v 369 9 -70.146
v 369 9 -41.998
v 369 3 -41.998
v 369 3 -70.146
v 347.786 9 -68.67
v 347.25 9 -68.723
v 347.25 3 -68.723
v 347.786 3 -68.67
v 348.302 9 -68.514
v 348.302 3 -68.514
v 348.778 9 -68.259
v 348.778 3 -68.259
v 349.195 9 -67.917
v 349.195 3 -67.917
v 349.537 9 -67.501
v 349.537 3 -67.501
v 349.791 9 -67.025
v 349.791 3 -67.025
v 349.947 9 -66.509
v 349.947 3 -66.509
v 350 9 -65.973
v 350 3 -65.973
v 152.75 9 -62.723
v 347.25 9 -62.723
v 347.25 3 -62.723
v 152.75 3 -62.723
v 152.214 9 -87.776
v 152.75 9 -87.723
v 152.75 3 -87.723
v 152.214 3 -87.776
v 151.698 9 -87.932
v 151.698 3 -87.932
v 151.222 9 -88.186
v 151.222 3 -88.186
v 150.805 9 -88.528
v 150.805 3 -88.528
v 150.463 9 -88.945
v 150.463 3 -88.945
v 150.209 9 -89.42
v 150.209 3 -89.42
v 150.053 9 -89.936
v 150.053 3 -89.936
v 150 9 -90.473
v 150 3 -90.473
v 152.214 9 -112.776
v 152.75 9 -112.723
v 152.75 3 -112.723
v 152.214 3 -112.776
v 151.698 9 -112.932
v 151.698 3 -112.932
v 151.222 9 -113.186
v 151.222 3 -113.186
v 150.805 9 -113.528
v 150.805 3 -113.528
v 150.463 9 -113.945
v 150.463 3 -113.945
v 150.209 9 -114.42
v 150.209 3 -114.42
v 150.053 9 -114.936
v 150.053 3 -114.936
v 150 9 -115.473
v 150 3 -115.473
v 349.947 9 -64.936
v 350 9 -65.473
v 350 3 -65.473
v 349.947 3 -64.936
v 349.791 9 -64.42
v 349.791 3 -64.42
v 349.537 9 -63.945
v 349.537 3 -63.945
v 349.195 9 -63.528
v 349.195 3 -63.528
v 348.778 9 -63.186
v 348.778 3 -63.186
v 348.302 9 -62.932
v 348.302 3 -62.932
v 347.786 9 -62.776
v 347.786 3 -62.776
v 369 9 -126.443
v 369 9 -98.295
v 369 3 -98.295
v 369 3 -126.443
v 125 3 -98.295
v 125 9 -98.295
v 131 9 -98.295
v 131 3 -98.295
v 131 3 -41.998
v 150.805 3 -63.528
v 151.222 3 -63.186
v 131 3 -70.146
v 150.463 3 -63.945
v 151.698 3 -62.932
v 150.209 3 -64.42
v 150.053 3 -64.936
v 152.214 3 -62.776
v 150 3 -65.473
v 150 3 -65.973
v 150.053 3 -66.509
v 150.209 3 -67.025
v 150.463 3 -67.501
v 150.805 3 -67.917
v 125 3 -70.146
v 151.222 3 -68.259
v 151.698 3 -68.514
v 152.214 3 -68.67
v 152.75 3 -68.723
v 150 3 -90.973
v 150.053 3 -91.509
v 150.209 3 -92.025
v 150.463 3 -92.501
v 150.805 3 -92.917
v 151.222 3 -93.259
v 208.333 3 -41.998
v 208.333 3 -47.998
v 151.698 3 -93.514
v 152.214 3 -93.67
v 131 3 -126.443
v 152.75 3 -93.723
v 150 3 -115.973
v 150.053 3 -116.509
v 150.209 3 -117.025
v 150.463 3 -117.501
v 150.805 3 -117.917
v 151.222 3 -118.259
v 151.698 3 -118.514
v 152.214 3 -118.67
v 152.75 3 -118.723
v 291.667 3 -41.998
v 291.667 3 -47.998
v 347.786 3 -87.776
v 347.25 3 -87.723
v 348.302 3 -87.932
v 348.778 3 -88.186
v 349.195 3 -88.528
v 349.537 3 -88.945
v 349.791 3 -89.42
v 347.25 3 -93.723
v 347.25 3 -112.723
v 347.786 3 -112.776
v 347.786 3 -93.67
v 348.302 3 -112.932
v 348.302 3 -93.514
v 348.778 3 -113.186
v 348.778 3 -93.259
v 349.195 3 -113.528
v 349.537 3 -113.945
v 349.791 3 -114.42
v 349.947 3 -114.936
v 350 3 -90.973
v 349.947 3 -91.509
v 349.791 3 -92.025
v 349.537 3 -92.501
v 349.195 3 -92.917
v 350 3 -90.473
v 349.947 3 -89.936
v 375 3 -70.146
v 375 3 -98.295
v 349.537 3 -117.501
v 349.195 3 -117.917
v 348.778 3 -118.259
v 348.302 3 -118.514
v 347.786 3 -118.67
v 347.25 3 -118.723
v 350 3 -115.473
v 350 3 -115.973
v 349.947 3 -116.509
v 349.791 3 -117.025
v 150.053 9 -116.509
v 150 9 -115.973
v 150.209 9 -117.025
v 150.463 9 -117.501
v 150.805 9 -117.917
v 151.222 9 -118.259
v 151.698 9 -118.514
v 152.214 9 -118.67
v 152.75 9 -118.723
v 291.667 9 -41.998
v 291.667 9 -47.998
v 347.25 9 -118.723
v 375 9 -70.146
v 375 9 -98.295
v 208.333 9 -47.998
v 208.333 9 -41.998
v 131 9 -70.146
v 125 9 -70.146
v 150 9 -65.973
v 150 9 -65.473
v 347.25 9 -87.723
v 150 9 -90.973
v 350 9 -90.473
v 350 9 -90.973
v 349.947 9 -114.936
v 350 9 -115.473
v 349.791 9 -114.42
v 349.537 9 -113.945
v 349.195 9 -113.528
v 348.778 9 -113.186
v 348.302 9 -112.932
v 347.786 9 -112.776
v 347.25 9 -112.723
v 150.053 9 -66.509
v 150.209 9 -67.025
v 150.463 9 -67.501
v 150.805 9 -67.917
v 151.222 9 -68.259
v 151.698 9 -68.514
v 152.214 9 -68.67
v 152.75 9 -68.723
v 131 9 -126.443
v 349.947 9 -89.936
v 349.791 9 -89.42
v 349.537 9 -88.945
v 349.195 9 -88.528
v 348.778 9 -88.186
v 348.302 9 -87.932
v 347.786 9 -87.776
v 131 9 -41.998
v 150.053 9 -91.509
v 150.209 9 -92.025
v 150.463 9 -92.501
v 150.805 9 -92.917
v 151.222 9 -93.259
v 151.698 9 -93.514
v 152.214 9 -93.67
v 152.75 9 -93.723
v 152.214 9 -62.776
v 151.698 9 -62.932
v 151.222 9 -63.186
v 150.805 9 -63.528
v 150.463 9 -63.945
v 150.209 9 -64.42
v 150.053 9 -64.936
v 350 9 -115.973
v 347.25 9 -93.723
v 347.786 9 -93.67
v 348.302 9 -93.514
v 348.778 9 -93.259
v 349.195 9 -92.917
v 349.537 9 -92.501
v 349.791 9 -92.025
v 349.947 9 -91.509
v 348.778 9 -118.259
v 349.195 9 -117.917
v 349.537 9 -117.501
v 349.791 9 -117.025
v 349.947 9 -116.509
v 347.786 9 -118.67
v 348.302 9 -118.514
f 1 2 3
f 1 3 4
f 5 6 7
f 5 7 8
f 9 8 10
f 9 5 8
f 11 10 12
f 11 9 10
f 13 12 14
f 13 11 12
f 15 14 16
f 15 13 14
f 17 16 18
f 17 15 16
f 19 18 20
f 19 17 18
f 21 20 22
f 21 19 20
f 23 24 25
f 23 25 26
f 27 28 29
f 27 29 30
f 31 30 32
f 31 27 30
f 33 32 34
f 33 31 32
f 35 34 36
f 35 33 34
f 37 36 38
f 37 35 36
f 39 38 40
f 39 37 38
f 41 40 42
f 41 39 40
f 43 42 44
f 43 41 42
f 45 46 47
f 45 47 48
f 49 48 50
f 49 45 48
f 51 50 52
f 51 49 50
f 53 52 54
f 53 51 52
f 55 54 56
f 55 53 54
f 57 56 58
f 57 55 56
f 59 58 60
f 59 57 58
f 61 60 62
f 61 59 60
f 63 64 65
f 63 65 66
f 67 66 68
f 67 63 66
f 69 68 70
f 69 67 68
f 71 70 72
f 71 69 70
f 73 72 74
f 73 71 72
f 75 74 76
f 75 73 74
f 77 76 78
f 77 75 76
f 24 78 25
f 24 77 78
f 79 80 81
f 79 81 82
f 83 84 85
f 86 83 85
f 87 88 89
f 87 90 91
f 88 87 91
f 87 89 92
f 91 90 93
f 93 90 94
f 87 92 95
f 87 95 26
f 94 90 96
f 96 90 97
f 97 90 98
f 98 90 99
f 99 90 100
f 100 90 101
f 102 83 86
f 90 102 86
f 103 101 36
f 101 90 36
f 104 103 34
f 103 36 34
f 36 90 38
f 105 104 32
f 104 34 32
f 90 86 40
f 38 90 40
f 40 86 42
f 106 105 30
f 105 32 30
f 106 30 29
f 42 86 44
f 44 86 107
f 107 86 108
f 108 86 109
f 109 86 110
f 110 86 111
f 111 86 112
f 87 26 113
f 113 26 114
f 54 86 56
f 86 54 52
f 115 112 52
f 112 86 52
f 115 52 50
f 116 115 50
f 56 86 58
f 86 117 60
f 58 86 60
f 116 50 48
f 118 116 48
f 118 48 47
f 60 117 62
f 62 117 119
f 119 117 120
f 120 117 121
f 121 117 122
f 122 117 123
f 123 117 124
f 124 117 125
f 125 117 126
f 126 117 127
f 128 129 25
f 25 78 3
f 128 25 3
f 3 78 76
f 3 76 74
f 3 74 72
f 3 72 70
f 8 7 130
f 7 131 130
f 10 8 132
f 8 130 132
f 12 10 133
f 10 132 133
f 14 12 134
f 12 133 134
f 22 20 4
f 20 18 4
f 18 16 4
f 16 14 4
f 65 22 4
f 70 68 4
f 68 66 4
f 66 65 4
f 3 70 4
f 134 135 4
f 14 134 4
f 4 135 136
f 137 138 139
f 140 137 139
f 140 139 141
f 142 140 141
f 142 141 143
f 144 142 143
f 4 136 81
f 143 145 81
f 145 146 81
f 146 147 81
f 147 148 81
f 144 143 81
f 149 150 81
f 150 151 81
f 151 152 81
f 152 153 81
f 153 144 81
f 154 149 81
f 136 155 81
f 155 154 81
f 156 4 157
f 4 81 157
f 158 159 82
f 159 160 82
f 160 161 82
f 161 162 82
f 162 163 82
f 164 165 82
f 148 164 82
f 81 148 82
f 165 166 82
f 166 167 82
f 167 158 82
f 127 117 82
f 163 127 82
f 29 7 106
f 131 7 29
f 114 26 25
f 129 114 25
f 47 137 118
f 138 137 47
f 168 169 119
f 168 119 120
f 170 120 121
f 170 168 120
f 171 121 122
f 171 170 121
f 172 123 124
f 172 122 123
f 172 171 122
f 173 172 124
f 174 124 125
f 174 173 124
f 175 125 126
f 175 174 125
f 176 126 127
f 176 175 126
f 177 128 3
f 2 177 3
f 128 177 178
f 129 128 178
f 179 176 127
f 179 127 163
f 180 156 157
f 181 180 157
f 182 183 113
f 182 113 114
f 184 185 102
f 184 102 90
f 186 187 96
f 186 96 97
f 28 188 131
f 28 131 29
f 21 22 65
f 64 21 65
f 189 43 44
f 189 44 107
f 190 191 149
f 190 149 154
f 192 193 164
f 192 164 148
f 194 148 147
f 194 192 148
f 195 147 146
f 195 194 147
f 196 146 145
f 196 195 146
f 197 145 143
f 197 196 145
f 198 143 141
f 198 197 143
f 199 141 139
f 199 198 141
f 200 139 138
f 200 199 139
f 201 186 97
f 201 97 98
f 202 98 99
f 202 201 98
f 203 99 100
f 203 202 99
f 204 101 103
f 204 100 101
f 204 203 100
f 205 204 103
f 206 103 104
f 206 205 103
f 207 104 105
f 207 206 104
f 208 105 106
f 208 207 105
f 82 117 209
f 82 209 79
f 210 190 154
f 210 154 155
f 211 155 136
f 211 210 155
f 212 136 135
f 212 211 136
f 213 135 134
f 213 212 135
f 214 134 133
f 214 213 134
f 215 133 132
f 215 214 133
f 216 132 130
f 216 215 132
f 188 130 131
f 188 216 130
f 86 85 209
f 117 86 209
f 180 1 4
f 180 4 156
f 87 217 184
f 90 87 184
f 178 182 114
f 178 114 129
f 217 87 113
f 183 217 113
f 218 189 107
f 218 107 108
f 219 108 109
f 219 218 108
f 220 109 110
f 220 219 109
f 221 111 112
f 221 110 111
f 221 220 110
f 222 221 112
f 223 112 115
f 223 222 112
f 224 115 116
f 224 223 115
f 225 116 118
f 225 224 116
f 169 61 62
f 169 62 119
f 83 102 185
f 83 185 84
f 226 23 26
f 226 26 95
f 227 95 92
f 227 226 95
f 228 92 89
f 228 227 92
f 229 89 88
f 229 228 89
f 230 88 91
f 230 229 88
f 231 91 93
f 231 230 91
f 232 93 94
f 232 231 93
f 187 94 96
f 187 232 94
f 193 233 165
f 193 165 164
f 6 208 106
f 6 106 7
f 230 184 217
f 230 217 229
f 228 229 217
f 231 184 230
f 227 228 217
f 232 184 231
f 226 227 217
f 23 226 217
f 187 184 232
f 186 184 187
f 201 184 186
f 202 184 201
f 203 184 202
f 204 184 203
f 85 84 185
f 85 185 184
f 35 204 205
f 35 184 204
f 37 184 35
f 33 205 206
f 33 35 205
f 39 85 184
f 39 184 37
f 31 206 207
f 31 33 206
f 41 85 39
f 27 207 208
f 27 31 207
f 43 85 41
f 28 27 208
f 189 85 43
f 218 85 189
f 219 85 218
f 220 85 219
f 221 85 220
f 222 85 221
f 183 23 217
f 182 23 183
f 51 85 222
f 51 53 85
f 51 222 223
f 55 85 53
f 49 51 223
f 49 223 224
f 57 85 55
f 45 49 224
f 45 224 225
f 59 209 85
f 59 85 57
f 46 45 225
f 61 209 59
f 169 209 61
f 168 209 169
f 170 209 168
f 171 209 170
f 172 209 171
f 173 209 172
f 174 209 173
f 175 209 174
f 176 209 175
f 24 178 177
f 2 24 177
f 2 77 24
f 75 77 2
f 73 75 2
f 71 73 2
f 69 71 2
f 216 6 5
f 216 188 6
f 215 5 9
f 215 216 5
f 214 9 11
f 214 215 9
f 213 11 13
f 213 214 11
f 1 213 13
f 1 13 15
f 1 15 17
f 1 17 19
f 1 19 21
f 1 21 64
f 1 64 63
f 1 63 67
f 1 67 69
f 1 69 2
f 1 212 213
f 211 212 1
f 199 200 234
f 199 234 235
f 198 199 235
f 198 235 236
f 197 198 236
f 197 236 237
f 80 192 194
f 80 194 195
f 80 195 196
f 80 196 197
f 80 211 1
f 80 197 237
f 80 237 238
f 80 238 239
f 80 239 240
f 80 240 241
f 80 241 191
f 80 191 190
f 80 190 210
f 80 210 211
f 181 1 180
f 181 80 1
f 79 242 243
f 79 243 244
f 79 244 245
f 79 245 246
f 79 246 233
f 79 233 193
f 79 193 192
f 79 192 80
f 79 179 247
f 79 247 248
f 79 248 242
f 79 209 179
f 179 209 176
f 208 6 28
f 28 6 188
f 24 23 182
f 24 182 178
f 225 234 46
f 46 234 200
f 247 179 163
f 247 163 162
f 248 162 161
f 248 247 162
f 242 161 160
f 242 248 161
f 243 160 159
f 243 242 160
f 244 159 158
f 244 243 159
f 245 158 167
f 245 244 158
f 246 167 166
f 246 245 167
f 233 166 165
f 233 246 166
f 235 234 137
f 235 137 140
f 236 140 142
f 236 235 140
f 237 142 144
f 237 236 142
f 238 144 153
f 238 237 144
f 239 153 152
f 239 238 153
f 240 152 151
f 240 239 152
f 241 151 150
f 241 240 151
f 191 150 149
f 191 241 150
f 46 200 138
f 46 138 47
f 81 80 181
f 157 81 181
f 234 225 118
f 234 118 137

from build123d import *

# Parameters (mm, degrees)
SKETCH1_W           = 500
SKETCH1_H           = 168.89
BOSS_EXTRUDE1_DEPTH = 12
SKETCH2_W           = 166.666666666
SKETCH2_H           = 12
CUT_EXTRUDE1_DEPTH  = 528.889981057
SKETCH4_W           = 12
SKETCH4_H           = 56.296666667
CUT_EXTRUDE3_DEPTH  = 528.889981057
CUT_EXTRUDE4_DEPTH  = 528.889981057
LPATTERN1_COUNT     = 3
LPATTERN1_PITCH     = 50
SCALE1_SCALE        = 0.5


with BuildPart() as part:
    # Sketch1 → Boss-Extrude1 (new body)
    with BuildSketch(Plane(origin=(0, 0, 0), x_dir=(1, 0, 0), z_dir=(0, 1, 0))):
        with Locations((250, 84.445)):
            Rectangle(SKETCH1_W, SKETCH1_H)
    extrude(amount=BOSS_EXTRUDE1_DEPTH)

    # Sketch2 → Cut-Extrude1 (cut, through all)
    with BuildSketch(Plane(origin=(0, 12, 0), x_dir=(1, 0, 0), z_dir=(0, 1, 0))):
        with Locations((250, 6)):
            Rectangle(SKETCH2_W, SKETCH2_H)
    extrude(amount=-CUT_EXTRUDE1_DEPTH, mode=Mode.SUBTRACT)

    # Sketch4 → Cut-Extrude3 (cut, through all)
    with BuildSketch(Plane(origin=(0, 12, 0), x_dir=(1, 0, 0), z_dir=(0, 1, 0))):
        with Locations((6, 140.741666667)):
            Rectangle(SKETCH4_W, SKETCH4_H)
        with Locations((6, 28.148333334)):
            Rectangle(SKETCH4_W, SKETCH4_H)
        with Locations((494, 28.148333334)):
            Rectangle(SKETCH4_W, SKETCH4_H)
        with Locations((494, 140.741666667)):
            Rectangle(SKETCH4_W, SKETCH4_H)
    extrude(amount=-CUT_EXTRUDE3_DEPTH, mode=Mode.SUBTRACT)

    # Sketch5 → Cut-Extrude4 (cut, through all)
    with BuildSketch(Plane(origin=(0, 12, 0), x_dir=(1, 0, 0), z_dir=(0, 1, 0))):
        with BuildLine():
            Line((55.5, 153.449523313), (444.5, 153.449523313))
            ThreePointArc((444.5, 153.449523313), (448.389087297, 151.838610609), (450, 147.949523313))
            Line((450, 147.949523313), (450, 146.949523313))
            ThreePointArc((450, 146.949523313), (448.389087297, 143.060436016), (444.5, 141.449523313))
            Line((444.5, 141.449523313), (55.5, 141.449523313))
            ThreePointArc((55.5, 141.449523313), (51.610912703, 143.060436016), (50, 146.949523313))
            Line((50, 146.949523313), (50, 147.949523313))
            ThreePointArc((50, 147.949523313), (51.610912703, 151.838610609), (55.5, 153.449523313))
        make_face()
    cut_extrude4 = extrude(amount=-CUT_EXTRUDE4_DEPTH, mode=Mode.SUBTRACT)

    # LPattern1: Cut-Extrude4 ×3
    with Locations(*[(0, 0, i * LPATTERN1_PITCH) for i in range(1, LPATTERN1_COUNT)]):
        add(cut_extrude4, mode=Mode.SUBTRACT)


with BuildPart() as part_1:
    # Scale1: scaled about (250, 6, -83.99618036)
    add(part.part.scale(SCALE1_SCALE).moved(Location((125, 3, -41.99809018))))


solid = part_1.part
